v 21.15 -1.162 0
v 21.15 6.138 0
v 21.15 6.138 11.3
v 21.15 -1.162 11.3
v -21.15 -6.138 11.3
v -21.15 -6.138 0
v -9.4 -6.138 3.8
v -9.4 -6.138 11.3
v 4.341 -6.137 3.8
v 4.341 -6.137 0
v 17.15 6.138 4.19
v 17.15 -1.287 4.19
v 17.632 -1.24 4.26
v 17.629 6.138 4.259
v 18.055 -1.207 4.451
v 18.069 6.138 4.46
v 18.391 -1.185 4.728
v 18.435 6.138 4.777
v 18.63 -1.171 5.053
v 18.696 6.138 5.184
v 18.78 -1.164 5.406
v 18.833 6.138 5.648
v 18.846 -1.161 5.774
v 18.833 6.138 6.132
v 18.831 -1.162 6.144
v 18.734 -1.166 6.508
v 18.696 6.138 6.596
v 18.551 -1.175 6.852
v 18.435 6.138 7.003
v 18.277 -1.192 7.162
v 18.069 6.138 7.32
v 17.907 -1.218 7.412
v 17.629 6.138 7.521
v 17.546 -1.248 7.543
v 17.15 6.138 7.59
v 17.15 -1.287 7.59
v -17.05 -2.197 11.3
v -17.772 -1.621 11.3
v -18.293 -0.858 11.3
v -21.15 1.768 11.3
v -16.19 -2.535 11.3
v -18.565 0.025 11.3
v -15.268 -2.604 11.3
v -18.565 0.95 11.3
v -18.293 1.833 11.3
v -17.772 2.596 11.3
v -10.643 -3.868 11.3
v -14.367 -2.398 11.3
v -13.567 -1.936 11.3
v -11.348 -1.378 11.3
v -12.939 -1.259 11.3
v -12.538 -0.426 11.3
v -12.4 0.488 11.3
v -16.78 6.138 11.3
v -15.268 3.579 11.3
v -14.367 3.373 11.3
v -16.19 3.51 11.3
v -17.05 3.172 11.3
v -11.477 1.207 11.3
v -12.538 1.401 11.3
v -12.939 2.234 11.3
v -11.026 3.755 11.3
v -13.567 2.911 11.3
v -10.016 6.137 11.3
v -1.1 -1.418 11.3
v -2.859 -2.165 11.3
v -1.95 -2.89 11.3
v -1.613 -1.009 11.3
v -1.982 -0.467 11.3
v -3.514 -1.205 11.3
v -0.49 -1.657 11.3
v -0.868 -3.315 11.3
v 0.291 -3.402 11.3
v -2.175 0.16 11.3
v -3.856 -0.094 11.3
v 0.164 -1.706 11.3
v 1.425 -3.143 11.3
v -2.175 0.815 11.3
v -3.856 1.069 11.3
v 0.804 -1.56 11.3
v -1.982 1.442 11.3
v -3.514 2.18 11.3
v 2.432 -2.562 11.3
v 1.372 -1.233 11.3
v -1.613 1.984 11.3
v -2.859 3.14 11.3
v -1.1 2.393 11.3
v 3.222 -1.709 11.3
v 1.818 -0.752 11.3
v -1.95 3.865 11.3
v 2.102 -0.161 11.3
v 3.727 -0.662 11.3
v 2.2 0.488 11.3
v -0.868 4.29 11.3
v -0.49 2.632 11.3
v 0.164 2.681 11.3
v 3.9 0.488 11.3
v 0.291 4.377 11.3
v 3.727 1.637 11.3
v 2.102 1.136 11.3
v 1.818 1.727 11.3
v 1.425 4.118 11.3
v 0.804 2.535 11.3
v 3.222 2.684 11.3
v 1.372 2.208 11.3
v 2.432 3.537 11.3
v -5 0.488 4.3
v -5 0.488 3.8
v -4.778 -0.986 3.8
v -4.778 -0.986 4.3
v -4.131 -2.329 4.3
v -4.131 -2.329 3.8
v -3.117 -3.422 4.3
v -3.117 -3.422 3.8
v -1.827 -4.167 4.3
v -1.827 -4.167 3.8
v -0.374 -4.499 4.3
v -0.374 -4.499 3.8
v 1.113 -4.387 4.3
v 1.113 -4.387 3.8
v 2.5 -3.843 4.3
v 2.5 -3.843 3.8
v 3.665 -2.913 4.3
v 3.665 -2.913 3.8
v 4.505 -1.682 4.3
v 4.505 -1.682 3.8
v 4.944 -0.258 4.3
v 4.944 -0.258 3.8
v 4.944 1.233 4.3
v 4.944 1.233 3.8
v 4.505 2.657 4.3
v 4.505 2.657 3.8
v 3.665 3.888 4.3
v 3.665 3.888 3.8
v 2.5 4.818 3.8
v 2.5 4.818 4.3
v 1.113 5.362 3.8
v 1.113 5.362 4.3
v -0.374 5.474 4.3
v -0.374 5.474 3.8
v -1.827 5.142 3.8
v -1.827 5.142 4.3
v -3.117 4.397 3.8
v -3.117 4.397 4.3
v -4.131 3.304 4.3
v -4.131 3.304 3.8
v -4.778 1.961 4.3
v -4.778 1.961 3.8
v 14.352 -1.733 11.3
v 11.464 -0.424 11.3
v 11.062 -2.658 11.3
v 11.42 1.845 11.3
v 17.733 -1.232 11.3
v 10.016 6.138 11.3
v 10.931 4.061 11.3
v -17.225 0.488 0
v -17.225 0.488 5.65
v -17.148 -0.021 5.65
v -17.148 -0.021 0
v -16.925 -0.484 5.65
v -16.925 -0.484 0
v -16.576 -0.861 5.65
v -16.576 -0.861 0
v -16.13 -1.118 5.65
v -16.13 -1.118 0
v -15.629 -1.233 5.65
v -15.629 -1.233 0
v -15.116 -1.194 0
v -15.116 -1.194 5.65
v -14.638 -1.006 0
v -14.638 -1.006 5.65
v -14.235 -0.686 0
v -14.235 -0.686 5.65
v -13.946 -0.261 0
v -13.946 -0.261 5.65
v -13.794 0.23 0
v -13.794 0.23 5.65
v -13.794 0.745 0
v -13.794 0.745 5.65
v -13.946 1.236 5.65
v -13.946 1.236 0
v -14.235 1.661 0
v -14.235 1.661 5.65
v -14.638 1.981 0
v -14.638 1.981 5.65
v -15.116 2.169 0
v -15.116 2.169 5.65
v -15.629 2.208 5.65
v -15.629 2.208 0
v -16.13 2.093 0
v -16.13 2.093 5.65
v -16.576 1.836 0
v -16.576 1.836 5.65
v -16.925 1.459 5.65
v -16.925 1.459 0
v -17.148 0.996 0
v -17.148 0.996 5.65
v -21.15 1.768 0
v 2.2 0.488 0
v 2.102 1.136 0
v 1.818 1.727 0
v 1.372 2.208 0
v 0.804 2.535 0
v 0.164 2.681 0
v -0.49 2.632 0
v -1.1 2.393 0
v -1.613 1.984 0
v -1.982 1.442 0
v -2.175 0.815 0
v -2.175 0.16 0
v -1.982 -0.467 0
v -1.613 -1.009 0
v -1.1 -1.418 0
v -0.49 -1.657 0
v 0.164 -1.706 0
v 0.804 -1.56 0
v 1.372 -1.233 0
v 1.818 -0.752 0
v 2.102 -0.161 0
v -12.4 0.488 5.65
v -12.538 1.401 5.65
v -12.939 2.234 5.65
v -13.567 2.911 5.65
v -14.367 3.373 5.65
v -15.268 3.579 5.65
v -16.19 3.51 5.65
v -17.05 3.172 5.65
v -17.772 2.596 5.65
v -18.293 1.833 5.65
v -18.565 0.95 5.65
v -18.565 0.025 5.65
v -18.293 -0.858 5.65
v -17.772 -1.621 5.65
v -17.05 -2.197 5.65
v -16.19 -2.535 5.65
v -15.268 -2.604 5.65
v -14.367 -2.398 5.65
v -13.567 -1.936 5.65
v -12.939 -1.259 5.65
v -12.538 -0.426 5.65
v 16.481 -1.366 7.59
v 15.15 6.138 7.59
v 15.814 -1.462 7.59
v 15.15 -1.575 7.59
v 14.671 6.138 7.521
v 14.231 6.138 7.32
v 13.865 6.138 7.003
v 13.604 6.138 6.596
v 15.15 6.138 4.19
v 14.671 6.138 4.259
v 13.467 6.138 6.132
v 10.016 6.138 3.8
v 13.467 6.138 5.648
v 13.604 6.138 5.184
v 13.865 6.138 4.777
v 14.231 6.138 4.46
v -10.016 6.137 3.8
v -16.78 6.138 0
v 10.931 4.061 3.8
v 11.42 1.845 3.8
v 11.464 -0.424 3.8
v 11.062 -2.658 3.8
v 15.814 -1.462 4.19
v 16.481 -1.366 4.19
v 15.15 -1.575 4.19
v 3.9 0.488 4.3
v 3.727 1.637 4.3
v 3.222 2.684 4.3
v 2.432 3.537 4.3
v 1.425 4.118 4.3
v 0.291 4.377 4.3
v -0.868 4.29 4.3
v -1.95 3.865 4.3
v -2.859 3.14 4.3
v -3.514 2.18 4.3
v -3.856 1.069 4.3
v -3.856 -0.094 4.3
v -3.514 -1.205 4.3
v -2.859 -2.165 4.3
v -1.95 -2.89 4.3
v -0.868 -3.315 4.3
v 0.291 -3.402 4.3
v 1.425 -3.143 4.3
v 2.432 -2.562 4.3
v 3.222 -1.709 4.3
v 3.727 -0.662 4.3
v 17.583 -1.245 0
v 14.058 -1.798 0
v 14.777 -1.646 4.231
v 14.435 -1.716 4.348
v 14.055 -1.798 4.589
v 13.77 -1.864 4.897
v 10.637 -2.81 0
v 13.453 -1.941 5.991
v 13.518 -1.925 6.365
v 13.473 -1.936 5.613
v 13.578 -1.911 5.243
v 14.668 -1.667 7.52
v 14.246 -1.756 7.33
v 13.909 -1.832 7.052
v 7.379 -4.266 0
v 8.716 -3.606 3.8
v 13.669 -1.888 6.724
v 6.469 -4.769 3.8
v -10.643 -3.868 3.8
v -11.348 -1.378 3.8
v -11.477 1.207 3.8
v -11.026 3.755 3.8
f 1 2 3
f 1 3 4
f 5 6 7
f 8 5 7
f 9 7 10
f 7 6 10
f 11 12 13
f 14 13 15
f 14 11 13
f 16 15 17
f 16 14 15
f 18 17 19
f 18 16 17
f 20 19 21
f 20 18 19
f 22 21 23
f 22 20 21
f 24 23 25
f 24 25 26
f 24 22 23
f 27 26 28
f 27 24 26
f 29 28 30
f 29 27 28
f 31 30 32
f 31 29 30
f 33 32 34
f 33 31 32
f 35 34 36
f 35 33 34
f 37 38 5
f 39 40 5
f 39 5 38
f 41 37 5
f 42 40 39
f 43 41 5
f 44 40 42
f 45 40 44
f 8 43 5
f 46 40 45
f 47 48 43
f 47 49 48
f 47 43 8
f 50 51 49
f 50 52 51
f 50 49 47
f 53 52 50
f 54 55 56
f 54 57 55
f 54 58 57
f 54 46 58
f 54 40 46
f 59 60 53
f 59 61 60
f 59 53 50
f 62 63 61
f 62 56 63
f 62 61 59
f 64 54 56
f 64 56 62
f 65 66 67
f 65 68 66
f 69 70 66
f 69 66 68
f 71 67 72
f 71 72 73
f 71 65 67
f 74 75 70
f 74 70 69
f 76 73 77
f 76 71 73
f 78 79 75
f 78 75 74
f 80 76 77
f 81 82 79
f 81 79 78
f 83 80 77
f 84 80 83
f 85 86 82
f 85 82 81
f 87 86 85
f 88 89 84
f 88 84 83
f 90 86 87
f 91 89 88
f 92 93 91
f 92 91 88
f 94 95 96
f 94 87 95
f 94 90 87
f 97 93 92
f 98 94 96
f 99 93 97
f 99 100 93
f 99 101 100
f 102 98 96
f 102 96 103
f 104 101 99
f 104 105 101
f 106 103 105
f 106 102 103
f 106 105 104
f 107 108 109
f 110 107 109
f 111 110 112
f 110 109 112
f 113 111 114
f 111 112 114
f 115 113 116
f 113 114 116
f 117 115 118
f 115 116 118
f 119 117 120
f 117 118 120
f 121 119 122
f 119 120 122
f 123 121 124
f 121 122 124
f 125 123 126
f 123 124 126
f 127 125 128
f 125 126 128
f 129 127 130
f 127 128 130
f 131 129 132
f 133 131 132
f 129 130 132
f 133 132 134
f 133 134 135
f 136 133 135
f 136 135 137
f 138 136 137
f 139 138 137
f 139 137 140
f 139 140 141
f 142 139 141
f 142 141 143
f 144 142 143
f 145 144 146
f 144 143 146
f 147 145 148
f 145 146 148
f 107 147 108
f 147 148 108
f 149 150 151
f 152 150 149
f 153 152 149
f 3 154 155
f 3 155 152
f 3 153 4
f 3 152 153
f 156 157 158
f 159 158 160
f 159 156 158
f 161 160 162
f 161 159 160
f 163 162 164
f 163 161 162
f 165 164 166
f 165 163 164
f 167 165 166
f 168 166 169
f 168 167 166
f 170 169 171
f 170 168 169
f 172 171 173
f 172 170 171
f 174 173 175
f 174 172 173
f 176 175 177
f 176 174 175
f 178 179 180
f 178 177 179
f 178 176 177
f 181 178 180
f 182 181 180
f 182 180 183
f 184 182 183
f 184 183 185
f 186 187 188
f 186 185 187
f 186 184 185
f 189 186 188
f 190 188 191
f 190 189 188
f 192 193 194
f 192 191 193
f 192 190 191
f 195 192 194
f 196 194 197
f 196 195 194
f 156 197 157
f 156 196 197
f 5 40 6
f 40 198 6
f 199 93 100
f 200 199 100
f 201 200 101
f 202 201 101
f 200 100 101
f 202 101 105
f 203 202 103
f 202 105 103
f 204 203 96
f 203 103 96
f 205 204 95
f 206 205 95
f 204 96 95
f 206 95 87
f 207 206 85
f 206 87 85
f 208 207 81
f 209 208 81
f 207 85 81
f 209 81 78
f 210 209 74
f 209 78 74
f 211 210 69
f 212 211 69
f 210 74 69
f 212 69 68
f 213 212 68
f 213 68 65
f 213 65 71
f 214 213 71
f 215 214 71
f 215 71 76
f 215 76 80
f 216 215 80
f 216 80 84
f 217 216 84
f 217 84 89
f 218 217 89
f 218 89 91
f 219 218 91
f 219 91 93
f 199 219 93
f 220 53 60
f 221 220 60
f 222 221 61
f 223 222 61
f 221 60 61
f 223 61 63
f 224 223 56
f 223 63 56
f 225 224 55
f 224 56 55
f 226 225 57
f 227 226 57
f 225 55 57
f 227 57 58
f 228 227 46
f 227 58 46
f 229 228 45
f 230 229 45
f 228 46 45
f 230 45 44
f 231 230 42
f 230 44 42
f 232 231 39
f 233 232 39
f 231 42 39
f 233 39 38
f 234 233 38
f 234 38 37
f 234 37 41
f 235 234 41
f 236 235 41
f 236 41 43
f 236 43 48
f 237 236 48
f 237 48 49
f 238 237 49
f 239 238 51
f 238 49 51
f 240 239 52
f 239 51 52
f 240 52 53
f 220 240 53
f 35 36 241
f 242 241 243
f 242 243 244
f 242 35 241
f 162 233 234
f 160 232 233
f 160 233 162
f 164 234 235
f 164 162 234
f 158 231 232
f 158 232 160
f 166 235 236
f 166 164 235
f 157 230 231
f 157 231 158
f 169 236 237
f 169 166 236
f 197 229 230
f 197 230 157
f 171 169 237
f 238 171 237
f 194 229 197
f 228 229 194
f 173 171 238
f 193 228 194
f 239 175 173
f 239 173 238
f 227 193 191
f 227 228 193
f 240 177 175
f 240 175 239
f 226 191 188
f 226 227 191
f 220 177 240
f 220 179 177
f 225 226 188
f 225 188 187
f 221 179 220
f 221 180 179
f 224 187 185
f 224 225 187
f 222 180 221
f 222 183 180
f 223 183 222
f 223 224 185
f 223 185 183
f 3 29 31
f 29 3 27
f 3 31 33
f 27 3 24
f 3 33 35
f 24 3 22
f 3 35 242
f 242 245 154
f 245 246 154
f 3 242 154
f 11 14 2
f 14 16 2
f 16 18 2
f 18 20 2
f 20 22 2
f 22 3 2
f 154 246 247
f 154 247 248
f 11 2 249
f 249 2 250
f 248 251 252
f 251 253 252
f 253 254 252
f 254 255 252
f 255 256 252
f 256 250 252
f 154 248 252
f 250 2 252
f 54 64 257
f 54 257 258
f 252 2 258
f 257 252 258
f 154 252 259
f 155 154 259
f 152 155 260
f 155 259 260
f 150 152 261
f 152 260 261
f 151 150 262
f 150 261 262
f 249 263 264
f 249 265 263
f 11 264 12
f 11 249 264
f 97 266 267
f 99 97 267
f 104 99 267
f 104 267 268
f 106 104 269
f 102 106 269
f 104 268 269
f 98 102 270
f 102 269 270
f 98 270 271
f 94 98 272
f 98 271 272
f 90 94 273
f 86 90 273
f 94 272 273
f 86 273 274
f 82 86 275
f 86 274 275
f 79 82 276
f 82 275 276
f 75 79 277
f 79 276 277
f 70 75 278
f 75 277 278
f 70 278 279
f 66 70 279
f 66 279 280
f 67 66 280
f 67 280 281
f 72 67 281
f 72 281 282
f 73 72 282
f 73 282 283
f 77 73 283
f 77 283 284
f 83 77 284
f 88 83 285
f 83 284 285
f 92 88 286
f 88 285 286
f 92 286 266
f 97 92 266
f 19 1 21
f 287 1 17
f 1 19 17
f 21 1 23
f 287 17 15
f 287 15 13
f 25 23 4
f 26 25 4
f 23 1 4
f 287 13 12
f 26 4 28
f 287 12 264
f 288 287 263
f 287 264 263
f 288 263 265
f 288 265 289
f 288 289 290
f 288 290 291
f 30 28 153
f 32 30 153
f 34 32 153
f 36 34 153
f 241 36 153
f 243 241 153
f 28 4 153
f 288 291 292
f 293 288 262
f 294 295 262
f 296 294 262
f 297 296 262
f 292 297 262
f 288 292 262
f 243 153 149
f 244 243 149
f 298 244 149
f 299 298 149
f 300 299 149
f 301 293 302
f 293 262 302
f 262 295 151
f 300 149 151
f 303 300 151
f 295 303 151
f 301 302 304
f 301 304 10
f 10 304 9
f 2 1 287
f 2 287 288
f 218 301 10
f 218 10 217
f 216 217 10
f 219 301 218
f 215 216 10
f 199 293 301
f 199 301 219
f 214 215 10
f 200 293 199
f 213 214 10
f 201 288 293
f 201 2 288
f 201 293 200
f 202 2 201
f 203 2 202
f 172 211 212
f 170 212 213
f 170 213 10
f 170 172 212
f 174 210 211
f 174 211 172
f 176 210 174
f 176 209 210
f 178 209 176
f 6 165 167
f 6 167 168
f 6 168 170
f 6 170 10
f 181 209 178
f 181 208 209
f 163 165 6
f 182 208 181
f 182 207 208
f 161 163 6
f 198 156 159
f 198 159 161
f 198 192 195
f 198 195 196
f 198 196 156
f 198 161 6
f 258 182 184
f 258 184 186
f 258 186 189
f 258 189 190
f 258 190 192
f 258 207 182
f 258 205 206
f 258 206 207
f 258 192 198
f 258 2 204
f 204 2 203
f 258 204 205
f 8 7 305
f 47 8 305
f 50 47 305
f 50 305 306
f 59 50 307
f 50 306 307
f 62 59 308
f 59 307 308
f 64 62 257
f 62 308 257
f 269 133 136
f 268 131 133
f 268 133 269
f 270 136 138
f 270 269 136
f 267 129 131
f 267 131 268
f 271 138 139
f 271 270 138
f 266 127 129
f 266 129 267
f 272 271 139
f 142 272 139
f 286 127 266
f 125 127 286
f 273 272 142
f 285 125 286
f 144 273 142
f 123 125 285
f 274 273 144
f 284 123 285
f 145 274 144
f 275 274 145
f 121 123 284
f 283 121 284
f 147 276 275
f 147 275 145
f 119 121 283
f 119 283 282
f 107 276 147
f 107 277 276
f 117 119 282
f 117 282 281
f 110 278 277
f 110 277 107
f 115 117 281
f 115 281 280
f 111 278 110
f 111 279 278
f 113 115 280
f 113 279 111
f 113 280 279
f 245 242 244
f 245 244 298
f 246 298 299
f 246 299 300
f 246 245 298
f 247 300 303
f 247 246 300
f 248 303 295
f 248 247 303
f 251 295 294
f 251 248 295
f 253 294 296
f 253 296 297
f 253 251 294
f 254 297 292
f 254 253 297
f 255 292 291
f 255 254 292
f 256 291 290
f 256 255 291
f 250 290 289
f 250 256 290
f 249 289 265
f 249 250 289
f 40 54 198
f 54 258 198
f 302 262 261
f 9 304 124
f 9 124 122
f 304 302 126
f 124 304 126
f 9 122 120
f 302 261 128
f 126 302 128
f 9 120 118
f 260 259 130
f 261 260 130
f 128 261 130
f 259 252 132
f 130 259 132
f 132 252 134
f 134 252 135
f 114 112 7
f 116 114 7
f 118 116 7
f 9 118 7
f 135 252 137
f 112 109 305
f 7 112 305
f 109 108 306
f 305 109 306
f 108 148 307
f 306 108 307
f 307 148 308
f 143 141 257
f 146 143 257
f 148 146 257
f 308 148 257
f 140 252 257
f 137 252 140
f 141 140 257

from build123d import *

# Parameters (mm, degrees)
SCHIZZO1_R                   = 1.725
ESTRUSIONE_ESTRUSIONE1_DEPTH = 3.8
SCHIZZO2_R                   = 1.725
ESTRUSIONE_ESTRUSIONE2_DEPTH = 7.5
SCHIZZO4_R                   = 3.1
TAGLIO_ESTRUSIONE1_DEPTH     = 5.65
SCHIZZO5_R                   = 5
ESTRUSIONE_ESTRUSIONE3_DEPTH = 0.5
SCHIZZO6_R                   = 3.9
ESTRUSIONE_ESTRUSIONE4_DEPTH = 7
SCHIZZO7_R                   = 2.2
TAGLIO_ESTRUSIONE2_DEPTH     = 25.75240203
TAGLIO_ESTRUSIONE3_DEPTH     = 25.75240203
TAGLIO_ESTRUSIONE4_DEPTH     = 27.938599166


with BuildPart() as part:
    # Schizzo1 → Estrusione-Estrusione1 (new body)
    with BuildSketch(Plane.XY):
        Polygon((-21.15, 1.7675), (-16.78, 6.1375), (21.15, 6.1375), (21.15, -6.1375), (-21.15, -6.1375), align=None)
        with Locations(Location((-15.5, 0.4875, 0), (0, 0, 180))):
            Circle(SCHIZZO1_R, mode=Mode.SUBTRACT)
    extrude(amount=ESTRUSIONE_ESTRUSIONE1_DEPTH)

    # Schizzo2 → Estrusione-Estrusione2 (add)
    # profile 1 of 2: a face of its own
    with BuildSketch(Plane.XY.offset(3.8)):
        with BuildLine():
            Line((-10.016361615, 6.1375), (-16.78, 6.1375))
            Line((-16.78, 6.1375), (-21.15, 1.7675))
            Line((-21.15, 1.7675), (-21.15, -6.1375))
            Line((-21.15, -6.1375), (-9.399966755, -6.1375))
            ThreePointArc((-9.399966755, -6.1375), (-11.485528203, -0.089251164), (-10.016361615, 6.1375))
        make_face()
        with Locations(Location((-15.5, 0.4875, 0), (0, 0, 180))):
            Circle(SCHIZZO2_R, mode=Mode.SUBTRACT)
    # profile 2 of 2: a face of its own
    with BuildSketch(Plane.XY.offset(3.8)):
        with BuildLine():
            Line((9.399966755, -6.1375), (21.15, -6.1375))
            Line((21.15, -6.1375), (21.15, 6.1375))
            Line((21.15, 6.1375), (10.016361615, 6.1375))
            ThreePointArc((10.016361615, 6.1375), (11.485528203, -0.089251164), (9.399966755, -6.1375))
        make_face()
    extrude(amount=ESTRUSIONE_ESTRUSIONE2_DEPTH)

    # Schizzo4 → Taglio-Estrusione1 (cut)
    with BuildSketch(Plane.XY.offset(11.3)):
        with Locations((-15.5, 0.4875)):
            Circle(SCHIZZO4_R)
    extrude(amount=-TAGLIO_ESTRUSIONE1_DEPTH, mode=Mode.SUBTRACT)

    # Schizzo5 → Estrusione-Estrusione3 (add)
    with BuildSketch(Plane.XY.offset(3.8)):
        with Locations(Location((0, 0.4875, 0), (0, 0, 180))):
            Circle(SCHIZZO5_R)
    extrude(amount=ESTRUSIONE_ESTRUSIONE3_DEPTH)

    # Schizzo6 → Estrusione-Estrusione4 (add)
    with BuildSketch(Plane.XY.offset(4.3)):
        with Locations((0, 0.4875)):
            Circle(SCHIZZO6_R)
    extrude(amount=ESTRUSIONE_ESTRUSIONE4_DEPTH)

    # Schizzo7 → Taglio-Estrusione2 (cut, through all)
    with BuildSketch(Plane.XY.offset(11.3)):
        with Locations((0, 0.4875)):
            Circle(SCHIZZO7_R)
    extrude(amount=-TAGLIO_ESTRUSIONE2_DEPTH, mode=Mode.SUBTRACT)

    # Schizzo8 → Taglio-Estrusione3 (cut, through all)
    with BuildSketch(Plane.XY.offset(11.3)):
        with BuildLine():
            Line((21.15, -6.1375), (21.15, -1.1616))
            ThreePointArc((21.15, -1.1616), (12.330643665, -2.247470782), (4.341411274, -6.1375))
            Line((4.341411274, -6.1375), (21.15, -6.1375))
        make_face()
    extrude(amount=-TAGLIO_ESTRUSIONE3_DEPTH, mode=Mode.SUBTRACT)

    # Schizzo9 → Taglio-Estrusione4 (cut, through all)
    with BuildSketch(Plane(origin=(0, 6.1375, 0), x_dir=(1, 0, 0), z_dir=(0, 1, 0))):
        with BuildLine():
            Line((17.15, -7.59), (15.15, -7.59))
            ThreePointArc((15.15, -7.59), (13.45, -5.89), (15.15, -4.19))
            Line((15.15, -4.19), (17.15, -4.19))
            ThreePointArc((17.15, -4.19), (18.85, -5.89), (17.15, -7.59))
        make_face()
    extrude(amount=-TAGLIO_ESTRUSIONE4_DEPTH, mode=Mode.SUBTRACT)


solid = part.part
